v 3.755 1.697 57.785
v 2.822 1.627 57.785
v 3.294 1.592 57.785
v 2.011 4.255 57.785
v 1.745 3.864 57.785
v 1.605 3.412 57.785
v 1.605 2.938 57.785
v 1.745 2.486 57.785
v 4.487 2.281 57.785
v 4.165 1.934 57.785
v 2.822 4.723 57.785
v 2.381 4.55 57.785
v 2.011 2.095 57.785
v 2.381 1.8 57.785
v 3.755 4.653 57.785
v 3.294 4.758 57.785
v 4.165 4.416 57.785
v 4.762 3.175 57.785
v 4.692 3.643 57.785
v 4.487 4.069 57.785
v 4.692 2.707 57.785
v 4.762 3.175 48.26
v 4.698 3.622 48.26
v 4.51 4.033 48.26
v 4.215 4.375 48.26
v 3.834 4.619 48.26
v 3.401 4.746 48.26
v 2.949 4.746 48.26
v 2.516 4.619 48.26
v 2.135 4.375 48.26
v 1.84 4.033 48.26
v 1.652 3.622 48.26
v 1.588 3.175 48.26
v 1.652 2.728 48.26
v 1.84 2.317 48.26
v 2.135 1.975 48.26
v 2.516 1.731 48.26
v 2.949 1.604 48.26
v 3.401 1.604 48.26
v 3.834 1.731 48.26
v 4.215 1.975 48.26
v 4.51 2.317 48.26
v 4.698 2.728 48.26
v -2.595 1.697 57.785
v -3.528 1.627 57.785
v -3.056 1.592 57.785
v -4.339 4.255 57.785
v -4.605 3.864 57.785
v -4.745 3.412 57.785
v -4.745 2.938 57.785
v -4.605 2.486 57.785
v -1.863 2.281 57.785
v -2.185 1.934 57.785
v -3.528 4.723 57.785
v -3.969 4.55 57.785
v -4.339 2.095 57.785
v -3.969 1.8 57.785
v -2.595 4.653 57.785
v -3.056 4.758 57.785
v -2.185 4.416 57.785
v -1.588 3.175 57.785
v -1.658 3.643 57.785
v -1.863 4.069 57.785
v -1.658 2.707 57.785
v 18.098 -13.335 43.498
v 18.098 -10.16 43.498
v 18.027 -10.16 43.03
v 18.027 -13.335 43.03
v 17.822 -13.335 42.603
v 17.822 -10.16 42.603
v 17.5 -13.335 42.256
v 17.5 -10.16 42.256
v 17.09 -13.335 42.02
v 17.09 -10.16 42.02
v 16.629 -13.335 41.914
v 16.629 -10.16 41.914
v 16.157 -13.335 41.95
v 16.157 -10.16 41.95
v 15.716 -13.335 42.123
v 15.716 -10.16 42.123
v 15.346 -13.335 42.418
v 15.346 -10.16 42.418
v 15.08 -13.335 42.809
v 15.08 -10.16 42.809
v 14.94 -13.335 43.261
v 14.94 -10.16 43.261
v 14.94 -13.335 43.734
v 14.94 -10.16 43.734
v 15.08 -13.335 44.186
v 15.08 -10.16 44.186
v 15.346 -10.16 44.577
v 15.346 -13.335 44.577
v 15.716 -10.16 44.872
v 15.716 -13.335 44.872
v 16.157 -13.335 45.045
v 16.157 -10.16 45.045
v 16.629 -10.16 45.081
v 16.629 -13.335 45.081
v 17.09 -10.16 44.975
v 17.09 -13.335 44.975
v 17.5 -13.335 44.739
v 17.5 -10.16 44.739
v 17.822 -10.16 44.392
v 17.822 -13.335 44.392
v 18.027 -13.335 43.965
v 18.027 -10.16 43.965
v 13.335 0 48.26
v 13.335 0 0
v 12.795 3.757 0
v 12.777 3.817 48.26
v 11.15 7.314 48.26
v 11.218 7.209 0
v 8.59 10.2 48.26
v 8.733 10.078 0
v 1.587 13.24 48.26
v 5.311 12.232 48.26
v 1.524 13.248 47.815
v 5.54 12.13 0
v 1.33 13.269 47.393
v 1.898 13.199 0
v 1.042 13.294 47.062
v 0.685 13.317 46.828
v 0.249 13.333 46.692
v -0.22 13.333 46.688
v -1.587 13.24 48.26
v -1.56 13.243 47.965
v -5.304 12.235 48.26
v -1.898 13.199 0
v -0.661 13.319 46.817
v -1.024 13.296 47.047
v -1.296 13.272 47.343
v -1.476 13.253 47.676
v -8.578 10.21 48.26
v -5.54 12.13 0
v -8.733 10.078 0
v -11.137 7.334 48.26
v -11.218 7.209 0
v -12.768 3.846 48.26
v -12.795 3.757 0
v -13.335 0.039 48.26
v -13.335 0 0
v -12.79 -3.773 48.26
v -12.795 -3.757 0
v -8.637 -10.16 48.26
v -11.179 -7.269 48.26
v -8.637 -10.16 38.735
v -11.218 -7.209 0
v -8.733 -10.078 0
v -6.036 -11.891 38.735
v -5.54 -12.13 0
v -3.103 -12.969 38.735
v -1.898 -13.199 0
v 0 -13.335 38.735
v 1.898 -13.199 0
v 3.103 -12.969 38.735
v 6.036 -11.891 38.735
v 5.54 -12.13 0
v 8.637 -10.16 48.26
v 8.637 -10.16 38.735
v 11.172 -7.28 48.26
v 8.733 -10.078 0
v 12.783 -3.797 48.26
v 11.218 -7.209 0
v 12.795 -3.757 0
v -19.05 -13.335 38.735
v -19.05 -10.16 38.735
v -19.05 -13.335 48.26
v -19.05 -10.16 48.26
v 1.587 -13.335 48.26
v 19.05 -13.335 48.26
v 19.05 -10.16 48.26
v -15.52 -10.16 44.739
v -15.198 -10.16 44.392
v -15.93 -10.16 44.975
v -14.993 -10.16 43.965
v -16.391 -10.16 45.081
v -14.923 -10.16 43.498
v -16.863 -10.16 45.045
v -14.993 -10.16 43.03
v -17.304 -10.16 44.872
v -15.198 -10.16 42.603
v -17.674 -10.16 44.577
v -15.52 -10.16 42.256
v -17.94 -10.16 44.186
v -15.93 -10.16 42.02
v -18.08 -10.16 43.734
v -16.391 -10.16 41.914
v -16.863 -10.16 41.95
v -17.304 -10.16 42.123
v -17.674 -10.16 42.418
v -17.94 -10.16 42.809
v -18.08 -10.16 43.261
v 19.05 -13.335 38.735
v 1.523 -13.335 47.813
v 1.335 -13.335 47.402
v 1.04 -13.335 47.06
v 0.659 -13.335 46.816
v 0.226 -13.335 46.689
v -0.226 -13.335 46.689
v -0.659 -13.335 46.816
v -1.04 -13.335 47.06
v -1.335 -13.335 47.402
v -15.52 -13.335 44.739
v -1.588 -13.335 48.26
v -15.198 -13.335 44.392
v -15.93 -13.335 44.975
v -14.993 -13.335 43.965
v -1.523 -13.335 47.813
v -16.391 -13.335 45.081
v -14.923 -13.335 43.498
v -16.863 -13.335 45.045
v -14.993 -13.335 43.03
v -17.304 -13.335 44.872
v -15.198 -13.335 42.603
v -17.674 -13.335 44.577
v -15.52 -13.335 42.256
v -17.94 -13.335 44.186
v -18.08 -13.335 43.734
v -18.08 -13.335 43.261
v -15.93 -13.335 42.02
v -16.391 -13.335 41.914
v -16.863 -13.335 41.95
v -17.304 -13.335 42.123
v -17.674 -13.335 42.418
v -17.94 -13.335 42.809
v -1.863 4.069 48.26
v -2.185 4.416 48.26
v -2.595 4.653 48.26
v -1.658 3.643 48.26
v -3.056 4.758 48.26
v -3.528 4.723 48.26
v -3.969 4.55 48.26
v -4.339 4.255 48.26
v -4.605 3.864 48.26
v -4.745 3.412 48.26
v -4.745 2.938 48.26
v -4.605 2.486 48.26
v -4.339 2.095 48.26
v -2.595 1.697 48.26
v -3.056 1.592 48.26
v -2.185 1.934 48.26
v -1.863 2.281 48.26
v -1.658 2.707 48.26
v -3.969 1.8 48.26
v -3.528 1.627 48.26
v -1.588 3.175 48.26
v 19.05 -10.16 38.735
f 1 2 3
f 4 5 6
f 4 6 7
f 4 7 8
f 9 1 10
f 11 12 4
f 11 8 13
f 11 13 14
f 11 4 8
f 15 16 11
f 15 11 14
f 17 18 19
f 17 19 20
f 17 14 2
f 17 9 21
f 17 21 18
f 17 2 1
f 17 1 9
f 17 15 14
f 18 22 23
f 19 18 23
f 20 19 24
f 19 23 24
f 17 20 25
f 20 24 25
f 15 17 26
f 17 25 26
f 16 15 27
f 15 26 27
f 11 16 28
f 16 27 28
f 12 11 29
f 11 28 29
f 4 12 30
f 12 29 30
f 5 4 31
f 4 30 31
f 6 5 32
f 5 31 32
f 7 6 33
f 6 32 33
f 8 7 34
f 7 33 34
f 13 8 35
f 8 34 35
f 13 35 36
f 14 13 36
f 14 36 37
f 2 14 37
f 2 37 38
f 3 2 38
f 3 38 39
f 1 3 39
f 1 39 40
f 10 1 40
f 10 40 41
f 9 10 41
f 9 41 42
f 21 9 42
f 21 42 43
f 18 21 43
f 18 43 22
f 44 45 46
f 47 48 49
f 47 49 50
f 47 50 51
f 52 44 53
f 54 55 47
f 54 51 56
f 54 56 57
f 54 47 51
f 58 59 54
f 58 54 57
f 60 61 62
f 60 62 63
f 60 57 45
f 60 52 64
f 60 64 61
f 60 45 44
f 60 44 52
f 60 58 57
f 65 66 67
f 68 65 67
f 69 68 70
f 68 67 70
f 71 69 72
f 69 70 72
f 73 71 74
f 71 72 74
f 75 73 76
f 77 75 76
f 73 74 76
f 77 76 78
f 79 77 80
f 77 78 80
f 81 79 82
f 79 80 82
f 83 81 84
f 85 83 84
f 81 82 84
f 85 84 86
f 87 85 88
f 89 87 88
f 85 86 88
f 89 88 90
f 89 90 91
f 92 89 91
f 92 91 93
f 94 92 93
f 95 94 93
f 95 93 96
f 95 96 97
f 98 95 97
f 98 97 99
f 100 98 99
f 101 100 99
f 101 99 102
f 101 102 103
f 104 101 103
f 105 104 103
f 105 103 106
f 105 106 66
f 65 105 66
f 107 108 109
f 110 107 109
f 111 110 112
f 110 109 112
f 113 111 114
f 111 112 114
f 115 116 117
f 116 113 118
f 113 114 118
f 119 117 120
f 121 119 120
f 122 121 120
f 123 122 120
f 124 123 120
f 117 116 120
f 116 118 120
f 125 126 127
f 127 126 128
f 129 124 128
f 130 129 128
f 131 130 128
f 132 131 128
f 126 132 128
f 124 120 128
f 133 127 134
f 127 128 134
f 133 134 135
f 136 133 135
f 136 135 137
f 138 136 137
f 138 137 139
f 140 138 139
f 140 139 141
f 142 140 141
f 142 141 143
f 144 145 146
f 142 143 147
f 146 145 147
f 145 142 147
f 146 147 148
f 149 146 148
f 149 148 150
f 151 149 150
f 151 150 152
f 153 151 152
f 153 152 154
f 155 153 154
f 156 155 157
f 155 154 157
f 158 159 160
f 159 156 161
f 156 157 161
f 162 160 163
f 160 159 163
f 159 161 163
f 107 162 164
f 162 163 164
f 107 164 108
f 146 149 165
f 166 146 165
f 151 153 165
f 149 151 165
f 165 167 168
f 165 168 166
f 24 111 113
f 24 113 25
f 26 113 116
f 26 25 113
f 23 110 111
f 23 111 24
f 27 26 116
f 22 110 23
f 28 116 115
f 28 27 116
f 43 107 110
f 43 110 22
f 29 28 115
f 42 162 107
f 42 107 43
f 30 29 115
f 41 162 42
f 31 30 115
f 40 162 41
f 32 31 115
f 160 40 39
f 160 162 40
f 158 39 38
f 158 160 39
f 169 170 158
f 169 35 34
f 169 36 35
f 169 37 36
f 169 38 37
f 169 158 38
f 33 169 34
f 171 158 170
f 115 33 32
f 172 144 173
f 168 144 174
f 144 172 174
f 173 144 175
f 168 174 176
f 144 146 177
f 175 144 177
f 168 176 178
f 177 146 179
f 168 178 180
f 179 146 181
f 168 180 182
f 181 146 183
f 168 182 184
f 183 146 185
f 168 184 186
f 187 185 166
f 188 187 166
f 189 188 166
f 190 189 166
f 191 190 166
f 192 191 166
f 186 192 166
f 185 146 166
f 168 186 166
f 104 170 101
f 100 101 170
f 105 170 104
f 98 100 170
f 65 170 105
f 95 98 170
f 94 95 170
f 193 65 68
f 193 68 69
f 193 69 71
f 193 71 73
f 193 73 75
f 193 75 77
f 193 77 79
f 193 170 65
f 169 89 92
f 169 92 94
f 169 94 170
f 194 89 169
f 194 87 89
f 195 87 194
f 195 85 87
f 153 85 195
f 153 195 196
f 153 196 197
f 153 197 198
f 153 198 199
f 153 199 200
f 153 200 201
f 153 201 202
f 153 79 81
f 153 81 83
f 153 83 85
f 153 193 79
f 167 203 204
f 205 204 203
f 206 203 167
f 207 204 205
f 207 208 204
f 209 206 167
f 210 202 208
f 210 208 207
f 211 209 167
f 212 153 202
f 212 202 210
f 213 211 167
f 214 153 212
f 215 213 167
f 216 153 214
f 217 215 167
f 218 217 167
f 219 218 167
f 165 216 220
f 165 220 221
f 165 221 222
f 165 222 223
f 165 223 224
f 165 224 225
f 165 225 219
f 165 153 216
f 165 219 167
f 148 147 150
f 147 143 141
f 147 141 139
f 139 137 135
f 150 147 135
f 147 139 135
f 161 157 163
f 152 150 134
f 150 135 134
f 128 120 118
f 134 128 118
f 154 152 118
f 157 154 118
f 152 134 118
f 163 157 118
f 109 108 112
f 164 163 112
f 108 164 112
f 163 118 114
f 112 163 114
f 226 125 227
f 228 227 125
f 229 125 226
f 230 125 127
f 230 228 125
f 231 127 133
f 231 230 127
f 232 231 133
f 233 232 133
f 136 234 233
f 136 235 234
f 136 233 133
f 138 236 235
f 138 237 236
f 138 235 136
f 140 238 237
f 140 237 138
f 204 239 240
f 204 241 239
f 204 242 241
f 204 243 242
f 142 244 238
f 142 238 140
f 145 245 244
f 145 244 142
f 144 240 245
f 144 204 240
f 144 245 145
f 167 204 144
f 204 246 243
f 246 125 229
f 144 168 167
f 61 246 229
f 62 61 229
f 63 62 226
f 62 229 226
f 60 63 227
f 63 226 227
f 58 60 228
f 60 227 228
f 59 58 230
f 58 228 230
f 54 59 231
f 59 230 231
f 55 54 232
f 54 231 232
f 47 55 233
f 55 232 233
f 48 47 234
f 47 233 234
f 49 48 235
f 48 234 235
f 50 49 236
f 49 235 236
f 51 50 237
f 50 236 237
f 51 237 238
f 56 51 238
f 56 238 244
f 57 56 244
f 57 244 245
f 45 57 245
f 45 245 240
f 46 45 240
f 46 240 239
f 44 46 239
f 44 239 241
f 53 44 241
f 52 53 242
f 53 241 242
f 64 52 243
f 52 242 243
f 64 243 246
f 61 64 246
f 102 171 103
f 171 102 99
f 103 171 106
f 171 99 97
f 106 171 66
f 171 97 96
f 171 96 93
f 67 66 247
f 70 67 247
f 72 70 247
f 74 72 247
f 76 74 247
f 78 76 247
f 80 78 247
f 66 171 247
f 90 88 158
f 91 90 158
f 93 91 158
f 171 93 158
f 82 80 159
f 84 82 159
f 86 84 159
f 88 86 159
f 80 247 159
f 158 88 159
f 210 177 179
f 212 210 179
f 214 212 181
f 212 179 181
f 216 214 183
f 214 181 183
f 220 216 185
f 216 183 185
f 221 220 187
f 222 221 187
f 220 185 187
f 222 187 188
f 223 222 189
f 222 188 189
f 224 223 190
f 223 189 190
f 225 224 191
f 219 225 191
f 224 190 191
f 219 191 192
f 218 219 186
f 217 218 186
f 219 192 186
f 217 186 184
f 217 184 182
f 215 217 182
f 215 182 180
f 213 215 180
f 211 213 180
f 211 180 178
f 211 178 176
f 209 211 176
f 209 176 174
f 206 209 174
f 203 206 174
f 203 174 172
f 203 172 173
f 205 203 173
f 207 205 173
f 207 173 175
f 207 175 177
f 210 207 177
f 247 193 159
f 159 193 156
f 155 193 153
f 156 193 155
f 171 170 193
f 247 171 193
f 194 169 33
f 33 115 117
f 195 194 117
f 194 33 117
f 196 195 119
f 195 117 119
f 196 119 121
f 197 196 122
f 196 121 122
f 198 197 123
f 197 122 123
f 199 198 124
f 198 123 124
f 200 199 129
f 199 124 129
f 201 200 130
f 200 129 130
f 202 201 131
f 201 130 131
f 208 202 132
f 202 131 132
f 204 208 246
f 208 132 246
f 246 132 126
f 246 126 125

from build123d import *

# Parameters (mm, degrees)
SKETCH1_R                    = 13.335
BOSS_EXTRUDE1_DEPTH          = 48.26
SKETCH2_W                    = 38.1
SKETCH2_H                    = 9.525
BOSS_EXTRUDE2_DEPTH          = 3.175
F_1_8_0_125_DIAMETER_HOLE1_D = 3.175
SKETCH5_R                    = 1.5875
BOSS_EXTRUDE3_DEPTH          = 9.525


with BuildPart() as part:
    # Sketch1 → Boss-Extrude1 (new body)
    with BuildSketch(Plane.XY):
        Circle(SKETCH1_R)
    extrude(amount=BOSS_EXTRUDE1_DEPTH)

    # Sketch2 → Boss-Extrude2 (add)
    with BuildSketch(Plane(origin=(0, -13.335, 0), x_dir=(-1, 0, 0), z_dir=(0, -1, 0))):
        with Locations((0, -43.4975)):
            Rectangle(SKETCH2_W, SKETCH2_H)
    extrude(amount=-BOSS_EXTRUDE2_DEPTH)

    # 1/8 (0.125) Diameter Hole1 (through all)
    with Locations(Plane(origin=(0, -13.335, 0), x_dir=(-1, 0, 0), z_dir=(0, -1, 0))):
        with Locations((-16.51, -43.4975), (16.51, -43.4975), (0, -48.26)):
            Hole(F_1_8_0_125_DIAMETER_HOLE1_D / 2)

    # Sketch5 → Boss-Extrude3 (add)
    with BuildSketch(Plane.XY.offset(48.26)):
        with Locations((-3.175, 3.175)):
            Circle(SKETCH5_R)
        with Locations((3.175, 3.175)):
            Circle(SKETCH5_R)
    extrude(amount=BOSS_EXTRUDE3_DEPTH)


solid = part.part
